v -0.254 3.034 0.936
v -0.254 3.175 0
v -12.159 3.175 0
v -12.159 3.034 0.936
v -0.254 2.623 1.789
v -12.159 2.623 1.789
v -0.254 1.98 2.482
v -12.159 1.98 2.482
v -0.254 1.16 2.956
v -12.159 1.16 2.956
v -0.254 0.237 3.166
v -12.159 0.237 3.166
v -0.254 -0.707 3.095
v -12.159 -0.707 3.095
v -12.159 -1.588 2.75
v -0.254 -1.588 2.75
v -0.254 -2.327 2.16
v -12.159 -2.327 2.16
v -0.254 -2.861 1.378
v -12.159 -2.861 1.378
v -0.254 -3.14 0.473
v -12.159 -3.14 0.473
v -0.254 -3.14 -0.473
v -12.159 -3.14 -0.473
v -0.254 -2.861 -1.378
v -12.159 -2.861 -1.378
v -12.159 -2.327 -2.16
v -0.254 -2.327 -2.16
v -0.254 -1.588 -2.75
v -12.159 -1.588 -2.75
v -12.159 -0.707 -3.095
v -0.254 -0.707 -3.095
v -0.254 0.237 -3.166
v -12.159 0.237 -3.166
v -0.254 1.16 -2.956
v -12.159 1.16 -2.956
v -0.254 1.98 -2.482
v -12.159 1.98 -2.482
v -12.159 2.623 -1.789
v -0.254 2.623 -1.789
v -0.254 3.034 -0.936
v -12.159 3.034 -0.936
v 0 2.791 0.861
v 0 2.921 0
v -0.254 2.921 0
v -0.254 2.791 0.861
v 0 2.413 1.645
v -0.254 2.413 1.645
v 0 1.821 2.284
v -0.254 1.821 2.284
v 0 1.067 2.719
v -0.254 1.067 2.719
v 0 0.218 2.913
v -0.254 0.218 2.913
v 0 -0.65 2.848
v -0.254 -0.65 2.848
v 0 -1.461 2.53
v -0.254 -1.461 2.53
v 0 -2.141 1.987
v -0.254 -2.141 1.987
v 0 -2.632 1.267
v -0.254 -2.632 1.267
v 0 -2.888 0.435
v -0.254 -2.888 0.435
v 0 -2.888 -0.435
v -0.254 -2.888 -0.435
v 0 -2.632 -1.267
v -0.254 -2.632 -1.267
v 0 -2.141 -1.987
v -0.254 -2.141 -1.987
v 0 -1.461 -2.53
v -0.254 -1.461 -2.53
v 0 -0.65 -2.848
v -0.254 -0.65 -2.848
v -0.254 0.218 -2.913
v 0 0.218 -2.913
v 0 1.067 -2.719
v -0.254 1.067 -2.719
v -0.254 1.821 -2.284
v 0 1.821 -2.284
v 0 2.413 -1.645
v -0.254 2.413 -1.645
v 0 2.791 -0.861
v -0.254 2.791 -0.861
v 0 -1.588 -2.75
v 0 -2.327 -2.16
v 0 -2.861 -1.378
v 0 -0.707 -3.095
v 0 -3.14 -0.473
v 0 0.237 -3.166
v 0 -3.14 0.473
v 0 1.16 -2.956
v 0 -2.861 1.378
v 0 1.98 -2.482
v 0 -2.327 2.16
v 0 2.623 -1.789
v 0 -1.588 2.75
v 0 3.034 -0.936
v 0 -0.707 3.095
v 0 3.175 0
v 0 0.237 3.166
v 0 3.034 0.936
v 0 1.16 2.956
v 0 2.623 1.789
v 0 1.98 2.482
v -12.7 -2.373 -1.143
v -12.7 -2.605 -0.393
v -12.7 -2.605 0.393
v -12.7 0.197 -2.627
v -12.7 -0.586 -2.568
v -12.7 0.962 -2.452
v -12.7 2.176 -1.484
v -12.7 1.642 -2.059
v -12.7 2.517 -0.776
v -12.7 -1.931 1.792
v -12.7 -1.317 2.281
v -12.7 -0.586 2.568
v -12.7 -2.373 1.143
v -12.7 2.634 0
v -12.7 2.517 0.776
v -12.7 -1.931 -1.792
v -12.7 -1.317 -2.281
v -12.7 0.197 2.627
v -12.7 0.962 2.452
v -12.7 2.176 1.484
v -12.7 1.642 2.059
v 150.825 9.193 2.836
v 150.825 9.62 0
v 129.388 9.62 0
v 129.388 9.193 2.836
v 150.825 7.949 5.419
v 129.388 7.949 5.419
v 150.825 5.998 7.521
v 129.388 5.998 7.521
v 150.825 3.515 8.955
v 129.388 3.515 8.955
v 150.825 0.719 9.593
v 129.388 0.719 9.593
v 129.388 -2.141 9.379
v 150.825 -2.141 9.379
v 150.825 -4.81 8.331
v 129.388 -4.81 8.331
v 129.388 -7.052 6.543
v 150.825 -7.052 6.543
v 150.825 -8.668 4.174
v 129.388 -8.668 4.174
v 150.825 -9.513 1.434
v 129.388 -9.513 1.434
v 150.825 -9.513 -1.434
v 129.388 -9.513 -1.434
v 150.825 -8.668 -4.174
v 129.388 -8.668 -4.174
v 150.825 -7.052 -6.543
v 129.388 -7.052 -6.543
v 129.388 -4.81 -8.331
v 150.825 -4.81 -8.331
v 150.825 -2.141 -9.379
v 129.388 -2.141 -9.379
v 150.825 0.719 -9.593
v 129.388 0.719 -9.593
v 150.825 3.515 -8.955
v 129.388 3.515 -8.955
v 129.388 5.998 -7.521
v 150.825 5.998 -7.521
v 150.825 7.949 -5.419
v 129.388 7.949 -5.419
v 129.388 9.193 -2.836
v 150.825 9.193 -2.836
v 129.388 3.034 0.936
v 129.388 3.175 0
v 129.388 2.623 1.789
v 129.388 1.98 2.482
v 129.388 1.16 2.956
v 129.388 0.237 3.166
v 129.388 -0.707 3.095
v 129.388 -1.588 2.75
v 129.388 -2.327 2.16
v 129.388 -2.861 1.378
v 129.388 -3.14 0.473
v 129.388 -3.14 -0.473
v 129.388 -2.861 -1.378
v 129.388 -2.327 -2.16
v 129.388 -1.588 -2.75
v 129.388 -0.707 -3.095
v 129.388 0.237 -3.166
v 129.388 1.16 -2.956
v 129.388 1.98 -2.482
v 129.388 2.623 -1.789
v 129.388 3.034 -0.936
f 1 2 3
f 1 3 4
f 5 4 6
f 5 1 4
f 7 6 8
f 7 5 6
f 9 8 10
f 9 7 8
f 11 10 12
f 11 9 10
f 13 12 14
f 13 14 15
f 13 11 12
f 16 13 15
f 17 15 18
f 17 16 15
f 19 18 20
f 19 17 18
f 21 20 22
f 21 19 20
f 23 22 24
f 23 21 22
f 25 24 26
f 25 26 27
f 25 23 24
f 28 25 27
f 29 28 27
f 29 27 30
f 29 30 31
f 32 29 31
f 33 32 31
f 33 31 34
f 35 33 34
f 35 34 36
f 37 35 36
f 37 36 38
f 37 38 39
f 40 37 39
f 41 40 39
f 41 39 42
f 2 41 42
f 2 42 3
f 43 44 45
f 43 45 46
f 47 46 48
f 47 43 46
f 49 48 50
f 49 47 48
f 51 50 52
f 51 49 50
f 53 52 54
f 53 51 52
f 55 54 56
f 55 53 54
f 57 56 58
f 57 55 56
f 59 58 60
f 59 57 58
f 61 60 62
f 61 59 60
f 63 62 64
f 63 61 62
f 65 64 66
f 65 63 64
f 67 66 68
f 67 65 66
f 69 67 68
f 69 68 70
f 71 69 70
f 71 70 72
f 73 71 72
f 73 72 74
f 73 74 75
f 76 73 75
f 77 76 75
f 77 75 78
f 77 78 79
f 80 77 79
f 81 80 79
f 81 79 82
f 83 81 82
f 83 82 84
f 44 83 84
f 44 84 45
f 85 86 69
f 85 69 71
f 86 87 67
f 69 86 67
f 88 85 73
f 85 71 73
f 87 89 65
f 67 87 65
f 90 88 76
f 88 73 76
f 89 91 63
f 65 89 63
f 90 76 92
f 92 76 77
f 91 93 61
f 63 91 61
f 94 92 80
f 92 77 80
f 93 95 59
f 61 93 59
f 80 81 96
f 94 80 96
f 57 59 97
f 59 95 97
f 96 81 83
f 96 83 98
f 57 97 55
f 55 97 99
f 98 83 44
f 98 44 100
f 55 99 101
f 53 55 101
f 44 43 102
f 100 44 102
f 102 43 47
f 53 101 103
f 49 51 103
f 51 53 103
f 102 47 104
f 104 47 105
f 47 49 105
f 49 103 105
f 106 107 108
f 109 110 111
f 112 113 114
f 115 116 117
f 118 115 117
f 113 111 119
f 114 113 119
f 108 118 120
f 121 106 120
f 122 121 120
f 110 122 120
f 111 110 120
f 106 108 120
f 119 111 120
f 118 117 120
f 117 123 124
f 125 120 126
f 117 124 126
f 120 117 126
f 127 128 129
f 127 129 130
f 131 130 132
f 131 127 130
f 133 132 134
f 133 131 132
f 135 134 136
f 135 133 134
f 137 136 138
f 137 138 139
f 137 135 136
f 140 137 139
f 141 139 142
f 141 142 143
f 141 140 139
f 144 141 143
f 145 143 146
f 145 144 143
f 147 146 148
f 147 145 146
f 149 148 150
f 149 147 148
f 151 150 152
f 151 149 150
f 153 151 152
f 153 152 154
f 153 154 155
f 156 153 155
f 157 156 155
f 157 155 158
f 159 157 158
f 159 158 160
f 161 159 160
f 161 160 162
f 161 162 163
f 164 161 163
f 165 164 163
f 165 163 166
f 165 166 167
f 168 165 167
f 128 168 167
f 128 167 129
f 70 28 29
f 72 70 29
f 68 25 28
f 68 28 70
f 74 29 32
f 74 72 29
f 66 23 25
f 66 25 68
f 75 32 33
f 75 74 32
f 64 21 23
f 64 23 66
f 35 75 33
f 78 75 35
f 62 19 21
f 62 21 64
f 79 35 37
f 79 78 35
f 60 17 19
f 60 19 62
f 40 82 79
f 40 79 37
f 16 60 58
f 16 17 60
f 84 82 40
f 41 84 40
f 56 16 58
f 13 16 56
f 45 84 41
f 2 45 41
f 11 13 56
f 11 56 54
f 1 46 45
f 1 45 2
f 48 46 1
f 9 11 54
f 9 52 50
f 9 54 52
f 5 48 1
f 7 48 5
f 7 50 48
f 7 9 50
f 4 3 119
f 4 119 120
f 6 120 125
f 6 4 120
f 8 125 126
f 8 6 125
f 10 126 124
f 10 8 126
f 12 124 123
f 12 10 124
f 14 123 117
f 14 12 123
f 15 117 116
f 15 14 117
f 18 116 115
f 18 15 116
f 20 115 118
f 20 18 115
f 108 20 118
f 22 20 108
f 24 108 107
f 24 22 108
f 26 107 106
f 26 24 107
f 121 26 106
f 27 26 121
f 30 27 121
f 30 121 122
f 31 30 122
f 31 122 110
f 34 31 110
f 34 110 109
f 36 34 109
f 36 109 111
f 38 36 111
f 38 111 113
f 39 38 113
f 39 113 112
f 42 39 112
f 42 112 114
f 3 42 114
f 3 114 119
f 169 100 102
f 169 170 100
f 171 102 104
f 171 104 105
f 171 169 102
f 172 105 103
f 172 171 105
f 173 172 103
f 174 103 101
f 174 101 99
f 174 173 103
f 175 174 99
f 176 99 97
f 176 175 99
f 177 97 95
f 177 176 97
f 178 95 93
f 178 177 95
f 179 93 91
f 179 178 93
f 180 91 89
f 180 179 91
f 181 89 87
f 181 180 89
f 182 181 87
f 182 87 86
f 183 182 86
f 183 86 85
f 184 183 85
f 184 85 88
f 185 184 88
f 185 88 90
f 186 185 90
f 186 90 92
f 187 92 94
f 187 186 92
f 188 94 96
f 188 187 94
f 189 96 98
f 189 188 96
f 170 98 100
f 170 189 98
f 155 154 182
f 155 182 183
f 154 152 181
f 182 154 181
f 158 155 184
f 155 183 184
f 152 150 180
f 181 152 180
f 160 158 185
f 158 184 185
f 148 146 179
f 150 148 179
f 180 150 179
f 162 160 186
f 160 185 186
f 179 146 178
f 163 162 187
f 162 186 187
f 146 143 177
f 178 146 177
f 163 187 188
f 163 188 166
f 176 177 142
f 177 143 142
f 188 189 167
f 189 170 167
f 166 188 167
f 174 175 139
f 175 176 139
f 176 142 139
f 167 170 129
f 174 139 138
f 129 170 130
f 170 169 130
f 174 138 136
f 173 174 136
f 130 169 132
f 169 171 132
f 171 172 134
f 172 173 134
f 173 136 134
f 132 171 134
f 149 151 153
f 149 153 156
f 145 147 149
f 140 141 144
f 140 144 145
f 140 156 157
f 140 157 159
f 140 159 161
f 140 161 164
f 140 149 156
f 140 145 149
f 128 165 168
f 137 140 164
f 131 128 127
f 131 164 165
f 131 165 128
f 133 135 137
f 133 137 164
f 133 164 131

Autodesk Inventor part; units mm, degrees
sketch "Sketch_1" plane through (0, 0, 0) normal (0, 0, 1) x (1, 0, 0)
  line L0 (150.8252, 0) -> (0, 0)
  line L1 (0, 0) -> (0, 3.175)
  line L2 (0, 3.175) -> (129.3876, 3.175)
  line L3 (129.3876, 3.175) -> (129.3876, 9.6203)
  line L4 (129.3876, 9.6203) -> (150.8252, 9.6203)
  line L5 (150.8252, 9.6203) -> (150.8252, 0)
  line L6 (150.8252, 0) -> (0, 0)
revolve "Revolution1" add sketch "Sketch_1" angle 360 about axis through (150.8252, 0, 0) along (1, 0, 0)
sketch "Sketch_3" plane through (0, 0, 0) normal (0, 0, 1) x (1, 0, 0)
  line L0 (0, 0) -> (-12.7, 0)
  line L1 (-12.7, 0) -> (-12.7, 2.634)
  line L2 (-12.7, 2.634) -> (-12.159, 3.175)
  line L3 (-12.159, 3.175) -> (0, 3.175)
  line L4 (0, 3.175) -> (0, 0)
  line L5 (0, 0) -> (-12.7, 0)
revolve "Revolution2" add sketch "Sketch_3" angle 360 about axis through (0, 0, 0) along (1, 0, 0)
thread "Thread1" size "1/4-28 UNF" class "2A" standard "ANSI Unified Screw Threads" length 12.159
sketch "Sketch_30" plane through (0, 0, 0) normal (0, 0, 1) x (1, 0, 0)
  line L0 (0, 0) -> (-0.254, 0)
  line L1 (-0.254, 2.921) -> (0, 2.921)
  line L2 (0, 2.921) -> (0, 3.429)
  line L3 (0, 3.429) -> (-0.254, 3.429)
  line L4 (-0.254, 3.429) -> (-0.254, 2.921)
revolve "Revolution3" cut sketch "Sketch_30" angle 360 about axis through (0, 0, 0) along (1, 0, 0)
ref_plane "dia1_XY" through (0, 3.175, 0) normal (1, 0, 0) x (0, 0, -1)
ref_plane "dia1_YZ" through (0, 3.175, 0) normal (0, 0, -1) x (0, 1, 0)
ref_plane "dia1_ZX" through (0, 3.175, 0) normal (0, 1, 0) x (1, 0, 0)
ref_plane "dia12_XY" through (0, 0, 10.9537) normal (1, 0, 0) x (0, 0, -1)
ref_plane "dia12_YZ" through (0, 0, 10.9537) normal (0, 0, -1) x (0, 1, 0)
ref_plane "dia12_ZX" through (0, 0, 10.9537) normal (0, 1, 0) x (1, 0, 0)
ref_plane "dia2_XY" through (0, -3.175, 0) normal (1, 0, 0) x (0, 0, -1)
ref_plane "dia2_YZ" through (0, -3.175, 0) normal (0, 0, -1) x (0, 1, 0)
ref_plane "dia2_ZX" through (0, -3.175, 0) normal (0, 1, 0) x (1, 0, 0)
ref_plane "dia22_XY" through (0, 0, -10.9537) normal (1, 0, 0) x (0, 0, -1)
ref_plane "dia22_YZ" through (0, 0, -10.9537) normal (0, 0, -1) x (0, 1, 0)
ref_plane "dia22_ZX" through (0, 0, -10.9537) normal (0, 1, 0) x (1, 0, 0)
ref_plane "hh1_XY" through (180.9496, 0, 0) normal (0, 0, 1) x (1, 0, 0)
ref_plane "hh1_YZ" through (180.9496, 0, 0) normal (1, 0, 0) x (0, 1, 0)
ref_plane "hh1_ZX" through (180.9496, 0, 0) normal (0, 1, 0) x (0, 0, 1)
ref_plane "hh2_XY" through (187.3504, 0, 0) normal (0, 0, 1) x (1, 0, 0)
ref_plane "hh2_YZ" through (187.3504, 0, 0) normal (1, 0, 0) x (0, 1, 0)
ref_plane "hh2_ZX" through (187.3504, 0, 0) normal (0, 1, 0) x (0, 0, 1)
ref_plane "rl1_XY" through (-12.7, 0, 0) normal (1, 0, 0) x (0, 0, -1)
ref_plane "rl1_YZ" through (-12.7, 0, 0) normal (0, 0, -1) x (0, 1, 0)
ref_plane "rl1_ZX" through (-12.7, 0, 0) normal (0, 1, 0) x (1, 0, 0)
ref_plane "rl2_XY" through (0, 0, 0) normal (1, 0, 0) x (0, 0, -1)
ref_plane "rl2_YZ" through (0, 0, 0) normal (0, 0, -1) x (0, 1, 0)
ref_plane "rl2_ZX" through (0, 0, 0) normal (0, 1, 0) x (1, 0, 0)
ref_plane "rod_cp_XY" through (0, 0, 0) normal (1, 0, 0) x (0, 0, -1)
ref_plane "rod_cp_YZ" through (0, 0, 0) normal (0, 0, -1) x (0, 1, 0)
ref_plane "rod_cp_ZX" through (0, 0, 0) normal (0, 1, 0) x (1, 0, 0)
ref_plane "thd1_XY" through (-12.7, 3.175, 0) normal (1, 0, 0) x (0, 0, -1)
ref_plane "thd1_YZ" through (-12.7, 3.175, 0) normal (0, 0, -1) x (0, 1, 0)
ref_plane "thd1_ZX" through (-12.7, 3.175, 0) normal (0, 1, 0) x (1, 0, 0)
ref_plane "thd2_XY" through (-12.7, -3.175, 0) normal (1, 0, 0) x (0, 0, -1)
ref_plane "thd2_YZ" through (-12.7, -3.175, 0) normal (0, 0, -1) x (0, 1, 0)
ref_plane "thd2_ZX" through (-12.7, -3.175, 0) normal (0, 1, 0) x (1, 0, 0)
ref_plane "to_rod_clevis_XY" through (-16.764, 0, 0) normal (1, 0, 0) x (0, 0, -1)
ref_plane "to_rod_clevis_YZ" through (-16.764, 0, 0) normal (0, 0, -1) x (0, 1, 0)
ref_plane "to_rod_clevis_ZX" through (-16.764, 0, 0) normal (0, 1, 0) x (1, 0, 0)
properties part number "043.5-DXP0000_rod"
